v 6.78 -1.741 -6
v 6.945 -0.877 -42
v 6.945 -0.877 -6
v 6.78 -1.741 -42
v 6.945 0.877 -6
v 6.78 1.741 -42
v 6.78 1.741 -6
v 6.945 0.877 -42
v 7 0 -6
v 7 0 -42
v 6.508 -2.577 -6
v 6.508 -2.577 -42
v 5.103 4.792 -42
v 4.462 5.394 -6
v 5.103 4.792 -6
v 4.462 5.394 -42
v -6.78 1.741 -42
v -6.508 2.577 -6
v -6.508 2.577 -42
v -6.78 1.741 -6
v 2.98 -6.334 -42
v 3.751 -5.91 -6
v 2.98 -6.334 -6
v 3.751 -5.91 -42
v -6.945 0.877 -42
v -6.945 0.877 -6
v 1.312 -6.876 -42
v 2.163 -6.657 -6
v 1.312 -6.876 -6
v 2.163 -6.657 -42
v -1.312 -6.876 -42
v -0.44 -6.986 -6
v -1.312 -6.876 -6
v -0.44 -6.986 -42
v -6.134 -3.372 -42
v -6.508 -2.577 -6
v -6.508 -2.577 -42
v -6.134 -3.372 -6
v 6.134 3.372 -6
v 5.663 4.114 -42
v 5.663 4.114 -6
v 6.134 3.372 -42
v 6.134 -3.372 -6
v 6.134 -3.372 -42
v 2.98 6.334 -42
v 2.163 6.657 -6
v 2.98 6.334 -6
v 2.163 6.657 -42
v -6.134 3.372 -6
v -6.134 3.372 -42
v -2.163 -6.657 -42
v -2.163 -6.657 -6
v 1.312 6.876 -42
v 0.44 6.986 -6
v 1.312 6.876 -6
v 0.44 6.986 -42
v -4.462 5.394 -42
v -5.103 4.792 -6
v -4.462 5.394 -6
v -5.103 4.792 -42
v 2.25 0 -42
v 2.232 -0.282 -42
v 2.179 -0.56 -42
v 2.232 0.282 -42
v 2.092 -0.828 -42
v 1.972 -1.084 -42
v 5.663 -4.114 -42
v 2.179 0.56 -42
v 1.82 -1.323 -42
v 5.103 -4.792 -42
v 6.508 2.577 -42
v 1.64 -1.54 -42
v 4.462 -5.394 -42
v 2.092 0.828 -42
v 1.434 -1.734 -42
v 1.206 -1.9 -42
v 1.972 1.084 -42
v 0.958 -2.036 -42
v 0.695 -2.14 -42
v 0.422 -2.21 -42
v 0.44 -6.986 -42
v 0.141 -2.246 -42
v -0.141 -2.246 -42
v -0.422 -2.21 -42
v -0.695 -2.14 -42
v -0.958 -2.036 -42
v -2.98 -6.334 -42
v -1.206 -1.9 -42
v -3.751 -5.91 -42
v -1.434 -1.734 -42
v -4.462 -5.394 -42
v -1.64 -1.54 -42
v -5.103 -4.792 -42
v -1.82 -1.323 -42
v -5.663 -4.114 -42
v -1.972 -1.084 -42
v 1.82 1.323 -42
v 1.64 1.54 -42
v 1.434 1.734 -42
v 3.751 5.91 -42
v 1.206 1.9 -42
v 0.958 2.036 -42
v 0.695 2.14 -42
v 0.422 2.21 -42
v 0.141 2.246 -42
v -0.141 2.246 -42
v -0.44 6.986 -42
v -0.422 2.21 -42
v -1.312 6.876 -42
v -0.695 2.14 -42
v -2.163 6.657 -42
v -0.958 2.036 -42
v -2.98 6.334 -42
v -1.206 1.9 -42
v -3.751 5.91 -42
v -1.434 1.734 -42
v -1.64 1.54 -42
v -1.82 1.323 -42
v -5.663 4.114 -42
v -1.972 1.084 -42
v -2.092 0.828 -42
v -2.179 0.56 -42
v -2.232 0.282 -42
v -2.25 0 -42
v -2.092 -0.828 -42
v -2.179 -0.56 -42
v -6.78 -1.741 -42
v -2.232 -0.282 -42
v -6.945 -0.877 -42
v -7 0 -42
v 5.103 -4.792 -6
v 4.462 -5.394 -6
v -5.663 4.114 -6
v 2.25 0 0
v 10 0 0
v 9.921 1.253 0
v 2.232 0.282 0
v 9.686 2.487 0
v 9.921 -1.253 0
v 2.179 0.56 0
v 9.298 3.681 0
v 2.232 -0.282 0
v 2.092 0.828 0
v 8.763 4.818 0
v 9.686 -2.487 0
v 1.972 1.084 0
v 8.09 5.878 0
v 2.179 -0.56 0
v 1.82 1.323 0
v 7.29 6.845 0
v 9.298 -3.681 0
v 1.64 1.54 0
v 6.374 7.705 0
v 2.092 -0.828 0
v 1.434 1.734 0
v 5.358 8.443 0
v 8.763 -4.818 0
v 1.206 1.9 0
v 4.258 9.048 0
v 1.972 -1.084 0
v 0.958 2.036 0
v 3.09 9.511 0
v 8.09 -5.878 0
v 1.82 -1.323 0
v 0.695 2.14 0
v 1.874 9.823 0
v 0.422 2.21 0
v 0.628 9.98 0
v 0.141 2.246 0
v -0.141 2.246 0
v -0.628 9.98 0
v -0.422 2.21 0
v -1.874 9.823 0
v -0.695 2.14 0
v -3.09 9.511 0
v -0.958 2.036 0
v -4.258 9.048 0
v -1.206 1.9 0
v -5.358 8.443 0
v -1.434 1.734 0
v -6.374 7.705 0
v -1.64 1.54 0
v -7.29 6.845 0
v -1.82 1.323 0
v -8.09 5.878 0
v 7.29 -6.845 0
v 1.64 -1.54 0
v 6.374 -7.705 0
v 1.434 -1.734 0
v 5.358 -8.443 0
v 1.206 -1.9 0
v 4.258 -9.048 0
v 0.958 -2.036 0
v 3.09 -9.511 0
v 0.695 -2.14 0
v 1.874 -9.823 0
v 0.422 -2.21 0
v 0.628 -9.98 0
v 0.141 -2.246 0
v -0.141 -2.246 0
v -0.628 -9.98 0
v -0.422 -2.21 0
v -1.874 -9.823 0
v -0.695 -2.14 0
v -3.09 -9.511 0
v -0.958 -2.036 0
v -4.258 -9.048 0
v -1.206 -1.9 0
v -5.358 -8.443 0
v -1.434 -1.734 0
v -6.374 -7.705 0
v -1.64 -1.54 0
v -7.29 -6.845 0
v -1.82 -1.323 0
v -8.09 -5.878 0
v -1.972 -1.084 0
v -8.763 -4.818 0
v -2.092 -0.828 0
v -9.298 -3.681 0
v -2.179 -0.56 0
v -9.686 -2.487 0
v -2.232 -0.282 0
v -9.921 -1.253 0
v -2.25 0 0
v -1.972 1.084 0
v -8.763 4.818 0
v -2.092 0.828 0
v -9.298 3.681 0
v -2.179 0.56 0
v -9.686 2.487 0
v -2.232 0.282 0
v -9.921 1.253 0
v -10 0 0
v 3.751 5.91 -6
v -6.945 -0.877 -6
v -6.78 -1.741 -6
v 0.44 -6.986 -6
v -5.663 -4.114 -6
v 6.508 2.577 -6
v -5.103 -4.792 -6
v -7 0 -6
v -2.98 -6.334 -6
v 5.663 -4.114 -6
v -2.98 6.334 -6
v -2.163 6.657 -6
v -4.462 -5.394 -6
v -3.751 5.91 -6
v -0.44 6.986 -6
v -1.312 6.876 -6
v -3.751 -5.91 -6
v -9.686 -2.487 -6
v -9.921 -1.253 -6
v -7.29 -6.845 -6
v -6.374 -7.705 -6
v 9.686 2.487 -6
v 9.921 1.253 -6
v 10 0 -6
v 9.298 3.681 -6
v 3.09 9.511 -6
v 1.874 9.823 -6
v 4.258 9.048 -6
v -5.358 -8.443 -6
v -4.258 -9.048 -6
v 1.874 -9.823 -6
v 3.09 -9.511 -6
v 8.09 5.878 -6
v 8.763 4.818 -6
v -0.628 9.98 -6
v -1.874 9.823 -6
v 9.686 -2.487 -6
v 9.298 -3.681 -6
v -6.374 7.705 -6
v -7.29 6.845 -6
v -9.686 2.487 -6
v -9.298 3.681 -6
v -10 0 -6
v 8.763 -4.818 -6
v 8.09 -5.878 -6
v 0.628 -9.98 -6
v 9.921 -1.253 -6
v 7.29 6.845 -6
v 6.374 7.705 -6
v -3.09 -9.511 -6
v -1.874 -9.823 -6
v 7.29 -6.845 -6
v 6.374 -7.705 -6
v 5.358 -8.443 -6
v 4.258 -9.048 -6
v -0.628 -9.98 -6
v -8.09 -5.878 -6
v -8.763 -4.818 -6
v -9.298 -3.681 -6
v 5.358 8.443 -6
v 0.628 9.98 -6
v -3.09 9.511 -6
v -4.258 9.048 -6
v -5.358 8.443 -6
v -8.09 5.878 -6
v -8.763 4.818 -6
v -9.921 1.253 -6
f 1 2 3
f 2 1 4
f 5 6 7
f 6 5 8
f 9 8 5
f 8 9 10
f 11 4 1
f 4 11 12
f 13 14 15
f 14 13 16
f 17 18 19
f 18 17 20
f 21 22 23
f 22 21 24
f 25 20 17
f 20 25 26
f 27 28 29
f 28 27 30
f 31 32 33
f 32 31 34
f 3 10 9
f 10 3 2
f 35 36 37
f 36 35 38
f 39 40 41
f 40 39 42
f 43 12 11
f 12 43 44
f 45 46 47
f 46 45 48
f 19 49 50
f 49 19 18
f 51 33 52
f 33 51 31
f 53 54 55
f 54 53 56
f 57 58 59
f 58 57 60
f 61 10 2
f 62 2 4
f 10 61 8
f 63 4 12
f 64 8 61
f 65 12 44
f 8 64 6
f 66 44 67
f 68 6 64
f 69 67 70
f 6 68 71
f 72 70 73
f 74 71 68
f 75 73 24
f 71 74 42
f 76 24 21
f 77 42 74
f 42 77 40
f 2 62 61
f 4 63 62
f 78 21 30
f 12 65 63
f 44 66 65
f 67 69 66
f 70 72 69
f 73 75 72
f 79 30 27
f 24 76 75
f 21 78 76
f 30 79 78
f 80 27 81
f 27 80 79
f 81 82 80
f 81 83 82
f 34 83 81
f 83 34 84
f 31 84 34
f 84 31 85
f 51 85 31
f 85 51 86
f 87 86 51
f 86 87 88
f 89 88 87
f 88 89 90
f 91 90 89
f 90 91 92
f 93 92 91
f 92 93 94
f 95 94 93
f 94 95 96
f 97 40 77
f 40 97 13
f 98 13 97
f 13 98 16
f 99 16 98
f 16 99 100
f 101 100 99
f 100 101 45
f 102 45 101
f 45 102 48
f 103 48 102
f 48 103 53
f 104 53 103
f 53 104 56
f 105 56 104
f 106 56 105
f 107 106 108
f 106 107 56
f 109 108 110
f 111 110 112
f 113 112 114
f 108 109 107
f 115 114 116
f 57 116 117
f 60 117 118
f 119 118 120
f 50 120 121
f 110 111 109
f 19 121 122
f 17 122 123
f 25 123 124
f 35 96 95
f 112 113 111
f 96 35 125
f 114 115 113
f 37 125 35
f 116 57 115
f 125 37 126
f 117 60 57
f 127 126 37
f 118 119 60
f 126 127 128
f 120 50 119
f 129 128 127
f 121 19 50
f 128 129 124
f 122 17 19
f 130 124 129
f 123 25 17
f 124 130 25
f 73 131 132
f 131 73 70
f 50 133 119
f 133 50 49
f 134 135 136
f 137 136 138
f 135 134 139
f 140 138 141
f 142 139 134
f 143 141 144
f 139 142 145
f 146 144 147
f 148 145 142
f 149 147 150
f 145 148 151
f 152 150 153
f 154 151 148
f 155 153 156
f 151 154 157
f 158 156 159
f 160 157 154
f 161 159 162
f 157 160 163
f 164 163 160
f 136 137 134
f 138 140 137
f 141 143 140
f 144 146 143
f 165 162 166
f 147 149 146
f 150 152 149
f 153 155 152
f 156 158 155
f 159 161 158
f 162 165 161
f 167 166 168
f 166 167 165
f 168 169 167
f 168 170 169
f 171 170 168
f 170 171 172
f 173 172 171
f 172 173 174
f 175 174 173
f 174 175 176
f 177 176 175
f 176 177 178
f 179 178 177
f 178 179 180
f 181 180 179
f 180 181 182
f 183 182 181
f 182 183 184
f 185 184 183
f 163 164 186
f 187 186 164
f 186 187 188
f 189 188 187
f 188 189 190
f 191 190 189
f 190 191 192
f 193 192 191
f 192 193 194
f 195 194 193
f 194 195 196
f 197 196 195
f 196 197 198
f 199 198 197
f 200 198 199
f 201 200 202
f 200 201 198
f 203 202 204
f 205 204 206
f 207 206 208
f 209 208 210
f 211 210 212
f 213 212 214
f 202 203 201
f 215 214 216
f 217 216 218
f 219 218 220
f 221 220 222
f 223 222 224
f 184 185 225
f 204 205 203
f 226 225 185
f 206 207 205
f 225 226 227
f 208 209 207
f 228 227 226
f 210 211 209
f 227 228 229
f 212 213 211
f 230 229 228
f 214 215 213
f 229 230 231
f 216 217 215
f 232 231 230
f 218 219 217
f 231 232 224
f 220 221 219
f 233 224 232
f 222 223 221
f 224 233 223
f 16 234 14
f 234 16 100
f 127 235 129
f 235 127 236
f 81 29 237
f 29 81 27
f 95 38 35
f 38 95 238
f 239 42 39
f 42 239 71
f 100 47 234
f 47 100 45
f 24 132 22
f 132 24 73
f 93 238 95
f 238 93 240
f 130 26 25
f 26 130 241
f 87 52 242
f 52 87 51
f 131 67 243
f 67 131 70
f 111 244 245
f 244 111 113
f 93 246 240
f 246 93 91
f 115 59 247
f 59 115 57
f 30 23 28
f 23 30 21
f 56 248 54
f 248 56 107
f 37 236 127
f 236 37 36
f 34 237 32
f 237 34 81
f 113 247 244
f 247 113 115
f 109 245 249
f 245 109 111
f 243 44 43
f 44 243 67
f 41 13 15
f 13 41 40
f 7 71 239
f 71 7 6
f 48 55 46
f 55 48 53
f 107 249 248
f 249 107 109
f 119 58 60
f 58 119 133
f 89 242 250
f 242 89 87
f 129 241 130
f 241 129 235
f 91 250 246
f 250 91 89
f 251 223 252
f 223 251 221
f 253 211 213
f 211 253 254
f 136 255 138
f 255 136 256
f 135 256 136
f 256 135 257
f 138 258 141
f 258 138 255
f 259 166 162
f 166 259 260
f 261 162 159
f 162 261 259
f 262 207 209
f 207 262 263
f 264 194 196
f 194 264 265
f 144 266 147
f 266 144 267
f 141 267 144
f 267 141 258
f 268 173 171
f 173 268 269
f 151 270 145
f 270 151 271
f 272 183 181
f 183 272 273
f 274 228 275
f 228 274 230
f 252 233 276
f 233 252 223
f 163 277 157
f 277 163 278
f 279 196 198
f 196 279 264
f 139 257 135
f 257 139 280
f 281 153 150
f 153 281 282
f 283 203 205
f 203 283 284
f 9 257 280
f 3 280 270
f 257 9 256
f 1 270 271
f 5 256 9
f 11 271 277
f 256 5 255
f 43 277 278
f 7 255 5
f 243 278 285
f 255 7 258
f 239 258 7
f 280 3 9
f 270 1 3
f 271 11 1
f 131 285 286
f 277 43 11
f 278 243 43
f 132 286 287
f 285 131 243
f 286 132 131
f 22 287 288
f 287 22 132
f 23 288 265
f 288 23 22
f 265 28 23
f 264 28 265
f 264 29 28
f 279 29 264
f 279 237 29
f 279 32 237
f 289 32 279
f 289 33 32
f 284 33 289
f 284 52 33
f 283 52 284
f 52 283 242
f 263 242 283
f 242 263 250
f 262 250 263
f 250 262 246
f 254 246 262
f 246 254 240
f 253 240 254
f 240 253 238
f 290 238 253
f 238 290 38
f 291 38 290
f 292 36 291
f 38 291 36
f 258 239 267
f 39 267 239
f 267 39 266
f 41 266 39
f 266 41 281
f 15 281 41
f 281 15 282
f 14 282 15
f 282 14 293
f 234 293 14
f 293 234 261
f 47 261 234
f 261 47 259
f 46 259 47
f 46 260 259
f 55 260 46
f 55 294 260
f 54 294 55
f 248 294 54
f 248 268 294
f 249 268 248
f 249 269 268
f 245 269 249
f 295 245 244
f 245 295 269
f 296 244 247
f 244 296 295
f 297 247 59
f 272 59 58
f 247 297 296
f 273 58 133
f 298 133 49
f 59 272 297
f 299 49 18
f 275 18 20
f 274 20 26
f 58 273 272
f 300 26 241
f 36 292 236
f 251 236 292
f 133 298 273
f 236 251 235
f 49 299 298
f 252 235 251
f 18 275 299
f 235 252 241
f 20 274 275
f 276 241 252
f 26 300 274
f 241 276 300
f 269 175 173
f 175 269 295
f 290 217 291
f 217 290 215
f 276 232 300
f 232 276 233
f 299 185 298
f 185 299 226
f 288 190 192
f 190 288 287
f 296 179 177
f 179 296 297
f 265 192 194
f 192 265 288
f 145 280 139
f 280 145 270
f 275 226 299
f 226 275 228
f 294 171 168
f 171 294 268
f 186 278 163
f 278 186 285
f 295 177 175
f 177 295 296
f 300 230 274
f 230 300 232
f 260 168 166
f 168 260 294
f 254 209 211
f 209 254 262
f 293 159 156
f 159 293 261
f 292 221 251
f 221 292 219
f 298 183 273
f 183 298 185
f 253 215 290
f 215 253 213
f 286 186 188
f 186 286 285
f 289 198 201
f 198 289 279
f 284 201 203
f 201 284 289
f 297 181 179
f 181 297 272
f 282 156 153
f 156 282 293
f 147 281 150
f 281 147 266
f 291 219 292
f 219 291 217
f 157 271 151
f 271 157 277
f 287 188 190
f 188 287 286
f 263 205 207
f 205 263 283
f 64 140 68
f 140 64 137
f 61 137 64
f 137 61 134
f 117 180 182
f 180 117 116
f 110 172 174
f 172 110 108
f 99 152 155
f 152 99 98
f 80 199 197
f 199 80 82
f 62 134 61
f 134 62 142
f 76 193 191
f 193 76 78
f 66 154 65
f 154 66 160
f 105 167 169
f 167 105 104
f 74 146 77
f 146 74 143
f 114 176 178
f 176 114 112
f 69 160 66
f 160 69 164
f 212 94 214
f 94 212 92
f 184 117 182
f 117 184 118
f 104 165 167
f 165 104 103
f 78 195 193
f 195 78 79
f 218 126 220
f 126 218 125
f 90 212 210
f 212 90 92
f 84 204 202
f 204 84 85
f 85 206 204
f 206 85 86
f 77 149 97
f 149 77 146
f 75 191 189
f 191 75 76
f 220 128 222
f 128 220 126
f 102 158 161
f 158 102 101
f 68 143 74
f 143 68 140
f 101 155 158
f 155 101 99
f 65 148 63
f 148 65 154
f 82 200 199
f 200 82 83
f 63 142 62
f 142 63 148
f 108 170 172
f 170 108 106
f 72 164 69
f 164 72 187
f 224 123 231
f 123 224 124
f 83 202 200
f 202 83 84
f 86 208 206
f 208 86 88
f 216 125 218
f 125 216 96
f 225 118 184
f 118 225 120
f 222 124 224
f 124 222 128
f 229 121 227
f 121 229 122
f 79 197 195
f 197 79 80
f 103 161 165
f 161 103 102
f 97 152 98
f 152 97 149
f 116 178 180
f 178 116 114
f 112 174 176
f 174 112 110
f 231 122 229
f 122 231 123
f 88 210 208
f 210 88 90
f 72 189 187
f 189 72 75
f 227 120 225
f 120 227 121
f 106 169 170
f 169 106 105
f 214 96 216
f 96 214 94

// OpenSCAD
$fn = 50;


difference() {
	union() {
		translate(v = [0, 0, -42.0000000000]) {
			cylinder(h = 42, r = 7.0000000000);
		}
		translate(v = [0, 0, -6.0000000000]) {
			cylinder(h = 6, r = 10.0000000000);
		}
	}
	union() {
		#translate(v = [0, 0, -42]) {
			cylinder(h = 42, r = 2.2500000000);
		}
	}
}
